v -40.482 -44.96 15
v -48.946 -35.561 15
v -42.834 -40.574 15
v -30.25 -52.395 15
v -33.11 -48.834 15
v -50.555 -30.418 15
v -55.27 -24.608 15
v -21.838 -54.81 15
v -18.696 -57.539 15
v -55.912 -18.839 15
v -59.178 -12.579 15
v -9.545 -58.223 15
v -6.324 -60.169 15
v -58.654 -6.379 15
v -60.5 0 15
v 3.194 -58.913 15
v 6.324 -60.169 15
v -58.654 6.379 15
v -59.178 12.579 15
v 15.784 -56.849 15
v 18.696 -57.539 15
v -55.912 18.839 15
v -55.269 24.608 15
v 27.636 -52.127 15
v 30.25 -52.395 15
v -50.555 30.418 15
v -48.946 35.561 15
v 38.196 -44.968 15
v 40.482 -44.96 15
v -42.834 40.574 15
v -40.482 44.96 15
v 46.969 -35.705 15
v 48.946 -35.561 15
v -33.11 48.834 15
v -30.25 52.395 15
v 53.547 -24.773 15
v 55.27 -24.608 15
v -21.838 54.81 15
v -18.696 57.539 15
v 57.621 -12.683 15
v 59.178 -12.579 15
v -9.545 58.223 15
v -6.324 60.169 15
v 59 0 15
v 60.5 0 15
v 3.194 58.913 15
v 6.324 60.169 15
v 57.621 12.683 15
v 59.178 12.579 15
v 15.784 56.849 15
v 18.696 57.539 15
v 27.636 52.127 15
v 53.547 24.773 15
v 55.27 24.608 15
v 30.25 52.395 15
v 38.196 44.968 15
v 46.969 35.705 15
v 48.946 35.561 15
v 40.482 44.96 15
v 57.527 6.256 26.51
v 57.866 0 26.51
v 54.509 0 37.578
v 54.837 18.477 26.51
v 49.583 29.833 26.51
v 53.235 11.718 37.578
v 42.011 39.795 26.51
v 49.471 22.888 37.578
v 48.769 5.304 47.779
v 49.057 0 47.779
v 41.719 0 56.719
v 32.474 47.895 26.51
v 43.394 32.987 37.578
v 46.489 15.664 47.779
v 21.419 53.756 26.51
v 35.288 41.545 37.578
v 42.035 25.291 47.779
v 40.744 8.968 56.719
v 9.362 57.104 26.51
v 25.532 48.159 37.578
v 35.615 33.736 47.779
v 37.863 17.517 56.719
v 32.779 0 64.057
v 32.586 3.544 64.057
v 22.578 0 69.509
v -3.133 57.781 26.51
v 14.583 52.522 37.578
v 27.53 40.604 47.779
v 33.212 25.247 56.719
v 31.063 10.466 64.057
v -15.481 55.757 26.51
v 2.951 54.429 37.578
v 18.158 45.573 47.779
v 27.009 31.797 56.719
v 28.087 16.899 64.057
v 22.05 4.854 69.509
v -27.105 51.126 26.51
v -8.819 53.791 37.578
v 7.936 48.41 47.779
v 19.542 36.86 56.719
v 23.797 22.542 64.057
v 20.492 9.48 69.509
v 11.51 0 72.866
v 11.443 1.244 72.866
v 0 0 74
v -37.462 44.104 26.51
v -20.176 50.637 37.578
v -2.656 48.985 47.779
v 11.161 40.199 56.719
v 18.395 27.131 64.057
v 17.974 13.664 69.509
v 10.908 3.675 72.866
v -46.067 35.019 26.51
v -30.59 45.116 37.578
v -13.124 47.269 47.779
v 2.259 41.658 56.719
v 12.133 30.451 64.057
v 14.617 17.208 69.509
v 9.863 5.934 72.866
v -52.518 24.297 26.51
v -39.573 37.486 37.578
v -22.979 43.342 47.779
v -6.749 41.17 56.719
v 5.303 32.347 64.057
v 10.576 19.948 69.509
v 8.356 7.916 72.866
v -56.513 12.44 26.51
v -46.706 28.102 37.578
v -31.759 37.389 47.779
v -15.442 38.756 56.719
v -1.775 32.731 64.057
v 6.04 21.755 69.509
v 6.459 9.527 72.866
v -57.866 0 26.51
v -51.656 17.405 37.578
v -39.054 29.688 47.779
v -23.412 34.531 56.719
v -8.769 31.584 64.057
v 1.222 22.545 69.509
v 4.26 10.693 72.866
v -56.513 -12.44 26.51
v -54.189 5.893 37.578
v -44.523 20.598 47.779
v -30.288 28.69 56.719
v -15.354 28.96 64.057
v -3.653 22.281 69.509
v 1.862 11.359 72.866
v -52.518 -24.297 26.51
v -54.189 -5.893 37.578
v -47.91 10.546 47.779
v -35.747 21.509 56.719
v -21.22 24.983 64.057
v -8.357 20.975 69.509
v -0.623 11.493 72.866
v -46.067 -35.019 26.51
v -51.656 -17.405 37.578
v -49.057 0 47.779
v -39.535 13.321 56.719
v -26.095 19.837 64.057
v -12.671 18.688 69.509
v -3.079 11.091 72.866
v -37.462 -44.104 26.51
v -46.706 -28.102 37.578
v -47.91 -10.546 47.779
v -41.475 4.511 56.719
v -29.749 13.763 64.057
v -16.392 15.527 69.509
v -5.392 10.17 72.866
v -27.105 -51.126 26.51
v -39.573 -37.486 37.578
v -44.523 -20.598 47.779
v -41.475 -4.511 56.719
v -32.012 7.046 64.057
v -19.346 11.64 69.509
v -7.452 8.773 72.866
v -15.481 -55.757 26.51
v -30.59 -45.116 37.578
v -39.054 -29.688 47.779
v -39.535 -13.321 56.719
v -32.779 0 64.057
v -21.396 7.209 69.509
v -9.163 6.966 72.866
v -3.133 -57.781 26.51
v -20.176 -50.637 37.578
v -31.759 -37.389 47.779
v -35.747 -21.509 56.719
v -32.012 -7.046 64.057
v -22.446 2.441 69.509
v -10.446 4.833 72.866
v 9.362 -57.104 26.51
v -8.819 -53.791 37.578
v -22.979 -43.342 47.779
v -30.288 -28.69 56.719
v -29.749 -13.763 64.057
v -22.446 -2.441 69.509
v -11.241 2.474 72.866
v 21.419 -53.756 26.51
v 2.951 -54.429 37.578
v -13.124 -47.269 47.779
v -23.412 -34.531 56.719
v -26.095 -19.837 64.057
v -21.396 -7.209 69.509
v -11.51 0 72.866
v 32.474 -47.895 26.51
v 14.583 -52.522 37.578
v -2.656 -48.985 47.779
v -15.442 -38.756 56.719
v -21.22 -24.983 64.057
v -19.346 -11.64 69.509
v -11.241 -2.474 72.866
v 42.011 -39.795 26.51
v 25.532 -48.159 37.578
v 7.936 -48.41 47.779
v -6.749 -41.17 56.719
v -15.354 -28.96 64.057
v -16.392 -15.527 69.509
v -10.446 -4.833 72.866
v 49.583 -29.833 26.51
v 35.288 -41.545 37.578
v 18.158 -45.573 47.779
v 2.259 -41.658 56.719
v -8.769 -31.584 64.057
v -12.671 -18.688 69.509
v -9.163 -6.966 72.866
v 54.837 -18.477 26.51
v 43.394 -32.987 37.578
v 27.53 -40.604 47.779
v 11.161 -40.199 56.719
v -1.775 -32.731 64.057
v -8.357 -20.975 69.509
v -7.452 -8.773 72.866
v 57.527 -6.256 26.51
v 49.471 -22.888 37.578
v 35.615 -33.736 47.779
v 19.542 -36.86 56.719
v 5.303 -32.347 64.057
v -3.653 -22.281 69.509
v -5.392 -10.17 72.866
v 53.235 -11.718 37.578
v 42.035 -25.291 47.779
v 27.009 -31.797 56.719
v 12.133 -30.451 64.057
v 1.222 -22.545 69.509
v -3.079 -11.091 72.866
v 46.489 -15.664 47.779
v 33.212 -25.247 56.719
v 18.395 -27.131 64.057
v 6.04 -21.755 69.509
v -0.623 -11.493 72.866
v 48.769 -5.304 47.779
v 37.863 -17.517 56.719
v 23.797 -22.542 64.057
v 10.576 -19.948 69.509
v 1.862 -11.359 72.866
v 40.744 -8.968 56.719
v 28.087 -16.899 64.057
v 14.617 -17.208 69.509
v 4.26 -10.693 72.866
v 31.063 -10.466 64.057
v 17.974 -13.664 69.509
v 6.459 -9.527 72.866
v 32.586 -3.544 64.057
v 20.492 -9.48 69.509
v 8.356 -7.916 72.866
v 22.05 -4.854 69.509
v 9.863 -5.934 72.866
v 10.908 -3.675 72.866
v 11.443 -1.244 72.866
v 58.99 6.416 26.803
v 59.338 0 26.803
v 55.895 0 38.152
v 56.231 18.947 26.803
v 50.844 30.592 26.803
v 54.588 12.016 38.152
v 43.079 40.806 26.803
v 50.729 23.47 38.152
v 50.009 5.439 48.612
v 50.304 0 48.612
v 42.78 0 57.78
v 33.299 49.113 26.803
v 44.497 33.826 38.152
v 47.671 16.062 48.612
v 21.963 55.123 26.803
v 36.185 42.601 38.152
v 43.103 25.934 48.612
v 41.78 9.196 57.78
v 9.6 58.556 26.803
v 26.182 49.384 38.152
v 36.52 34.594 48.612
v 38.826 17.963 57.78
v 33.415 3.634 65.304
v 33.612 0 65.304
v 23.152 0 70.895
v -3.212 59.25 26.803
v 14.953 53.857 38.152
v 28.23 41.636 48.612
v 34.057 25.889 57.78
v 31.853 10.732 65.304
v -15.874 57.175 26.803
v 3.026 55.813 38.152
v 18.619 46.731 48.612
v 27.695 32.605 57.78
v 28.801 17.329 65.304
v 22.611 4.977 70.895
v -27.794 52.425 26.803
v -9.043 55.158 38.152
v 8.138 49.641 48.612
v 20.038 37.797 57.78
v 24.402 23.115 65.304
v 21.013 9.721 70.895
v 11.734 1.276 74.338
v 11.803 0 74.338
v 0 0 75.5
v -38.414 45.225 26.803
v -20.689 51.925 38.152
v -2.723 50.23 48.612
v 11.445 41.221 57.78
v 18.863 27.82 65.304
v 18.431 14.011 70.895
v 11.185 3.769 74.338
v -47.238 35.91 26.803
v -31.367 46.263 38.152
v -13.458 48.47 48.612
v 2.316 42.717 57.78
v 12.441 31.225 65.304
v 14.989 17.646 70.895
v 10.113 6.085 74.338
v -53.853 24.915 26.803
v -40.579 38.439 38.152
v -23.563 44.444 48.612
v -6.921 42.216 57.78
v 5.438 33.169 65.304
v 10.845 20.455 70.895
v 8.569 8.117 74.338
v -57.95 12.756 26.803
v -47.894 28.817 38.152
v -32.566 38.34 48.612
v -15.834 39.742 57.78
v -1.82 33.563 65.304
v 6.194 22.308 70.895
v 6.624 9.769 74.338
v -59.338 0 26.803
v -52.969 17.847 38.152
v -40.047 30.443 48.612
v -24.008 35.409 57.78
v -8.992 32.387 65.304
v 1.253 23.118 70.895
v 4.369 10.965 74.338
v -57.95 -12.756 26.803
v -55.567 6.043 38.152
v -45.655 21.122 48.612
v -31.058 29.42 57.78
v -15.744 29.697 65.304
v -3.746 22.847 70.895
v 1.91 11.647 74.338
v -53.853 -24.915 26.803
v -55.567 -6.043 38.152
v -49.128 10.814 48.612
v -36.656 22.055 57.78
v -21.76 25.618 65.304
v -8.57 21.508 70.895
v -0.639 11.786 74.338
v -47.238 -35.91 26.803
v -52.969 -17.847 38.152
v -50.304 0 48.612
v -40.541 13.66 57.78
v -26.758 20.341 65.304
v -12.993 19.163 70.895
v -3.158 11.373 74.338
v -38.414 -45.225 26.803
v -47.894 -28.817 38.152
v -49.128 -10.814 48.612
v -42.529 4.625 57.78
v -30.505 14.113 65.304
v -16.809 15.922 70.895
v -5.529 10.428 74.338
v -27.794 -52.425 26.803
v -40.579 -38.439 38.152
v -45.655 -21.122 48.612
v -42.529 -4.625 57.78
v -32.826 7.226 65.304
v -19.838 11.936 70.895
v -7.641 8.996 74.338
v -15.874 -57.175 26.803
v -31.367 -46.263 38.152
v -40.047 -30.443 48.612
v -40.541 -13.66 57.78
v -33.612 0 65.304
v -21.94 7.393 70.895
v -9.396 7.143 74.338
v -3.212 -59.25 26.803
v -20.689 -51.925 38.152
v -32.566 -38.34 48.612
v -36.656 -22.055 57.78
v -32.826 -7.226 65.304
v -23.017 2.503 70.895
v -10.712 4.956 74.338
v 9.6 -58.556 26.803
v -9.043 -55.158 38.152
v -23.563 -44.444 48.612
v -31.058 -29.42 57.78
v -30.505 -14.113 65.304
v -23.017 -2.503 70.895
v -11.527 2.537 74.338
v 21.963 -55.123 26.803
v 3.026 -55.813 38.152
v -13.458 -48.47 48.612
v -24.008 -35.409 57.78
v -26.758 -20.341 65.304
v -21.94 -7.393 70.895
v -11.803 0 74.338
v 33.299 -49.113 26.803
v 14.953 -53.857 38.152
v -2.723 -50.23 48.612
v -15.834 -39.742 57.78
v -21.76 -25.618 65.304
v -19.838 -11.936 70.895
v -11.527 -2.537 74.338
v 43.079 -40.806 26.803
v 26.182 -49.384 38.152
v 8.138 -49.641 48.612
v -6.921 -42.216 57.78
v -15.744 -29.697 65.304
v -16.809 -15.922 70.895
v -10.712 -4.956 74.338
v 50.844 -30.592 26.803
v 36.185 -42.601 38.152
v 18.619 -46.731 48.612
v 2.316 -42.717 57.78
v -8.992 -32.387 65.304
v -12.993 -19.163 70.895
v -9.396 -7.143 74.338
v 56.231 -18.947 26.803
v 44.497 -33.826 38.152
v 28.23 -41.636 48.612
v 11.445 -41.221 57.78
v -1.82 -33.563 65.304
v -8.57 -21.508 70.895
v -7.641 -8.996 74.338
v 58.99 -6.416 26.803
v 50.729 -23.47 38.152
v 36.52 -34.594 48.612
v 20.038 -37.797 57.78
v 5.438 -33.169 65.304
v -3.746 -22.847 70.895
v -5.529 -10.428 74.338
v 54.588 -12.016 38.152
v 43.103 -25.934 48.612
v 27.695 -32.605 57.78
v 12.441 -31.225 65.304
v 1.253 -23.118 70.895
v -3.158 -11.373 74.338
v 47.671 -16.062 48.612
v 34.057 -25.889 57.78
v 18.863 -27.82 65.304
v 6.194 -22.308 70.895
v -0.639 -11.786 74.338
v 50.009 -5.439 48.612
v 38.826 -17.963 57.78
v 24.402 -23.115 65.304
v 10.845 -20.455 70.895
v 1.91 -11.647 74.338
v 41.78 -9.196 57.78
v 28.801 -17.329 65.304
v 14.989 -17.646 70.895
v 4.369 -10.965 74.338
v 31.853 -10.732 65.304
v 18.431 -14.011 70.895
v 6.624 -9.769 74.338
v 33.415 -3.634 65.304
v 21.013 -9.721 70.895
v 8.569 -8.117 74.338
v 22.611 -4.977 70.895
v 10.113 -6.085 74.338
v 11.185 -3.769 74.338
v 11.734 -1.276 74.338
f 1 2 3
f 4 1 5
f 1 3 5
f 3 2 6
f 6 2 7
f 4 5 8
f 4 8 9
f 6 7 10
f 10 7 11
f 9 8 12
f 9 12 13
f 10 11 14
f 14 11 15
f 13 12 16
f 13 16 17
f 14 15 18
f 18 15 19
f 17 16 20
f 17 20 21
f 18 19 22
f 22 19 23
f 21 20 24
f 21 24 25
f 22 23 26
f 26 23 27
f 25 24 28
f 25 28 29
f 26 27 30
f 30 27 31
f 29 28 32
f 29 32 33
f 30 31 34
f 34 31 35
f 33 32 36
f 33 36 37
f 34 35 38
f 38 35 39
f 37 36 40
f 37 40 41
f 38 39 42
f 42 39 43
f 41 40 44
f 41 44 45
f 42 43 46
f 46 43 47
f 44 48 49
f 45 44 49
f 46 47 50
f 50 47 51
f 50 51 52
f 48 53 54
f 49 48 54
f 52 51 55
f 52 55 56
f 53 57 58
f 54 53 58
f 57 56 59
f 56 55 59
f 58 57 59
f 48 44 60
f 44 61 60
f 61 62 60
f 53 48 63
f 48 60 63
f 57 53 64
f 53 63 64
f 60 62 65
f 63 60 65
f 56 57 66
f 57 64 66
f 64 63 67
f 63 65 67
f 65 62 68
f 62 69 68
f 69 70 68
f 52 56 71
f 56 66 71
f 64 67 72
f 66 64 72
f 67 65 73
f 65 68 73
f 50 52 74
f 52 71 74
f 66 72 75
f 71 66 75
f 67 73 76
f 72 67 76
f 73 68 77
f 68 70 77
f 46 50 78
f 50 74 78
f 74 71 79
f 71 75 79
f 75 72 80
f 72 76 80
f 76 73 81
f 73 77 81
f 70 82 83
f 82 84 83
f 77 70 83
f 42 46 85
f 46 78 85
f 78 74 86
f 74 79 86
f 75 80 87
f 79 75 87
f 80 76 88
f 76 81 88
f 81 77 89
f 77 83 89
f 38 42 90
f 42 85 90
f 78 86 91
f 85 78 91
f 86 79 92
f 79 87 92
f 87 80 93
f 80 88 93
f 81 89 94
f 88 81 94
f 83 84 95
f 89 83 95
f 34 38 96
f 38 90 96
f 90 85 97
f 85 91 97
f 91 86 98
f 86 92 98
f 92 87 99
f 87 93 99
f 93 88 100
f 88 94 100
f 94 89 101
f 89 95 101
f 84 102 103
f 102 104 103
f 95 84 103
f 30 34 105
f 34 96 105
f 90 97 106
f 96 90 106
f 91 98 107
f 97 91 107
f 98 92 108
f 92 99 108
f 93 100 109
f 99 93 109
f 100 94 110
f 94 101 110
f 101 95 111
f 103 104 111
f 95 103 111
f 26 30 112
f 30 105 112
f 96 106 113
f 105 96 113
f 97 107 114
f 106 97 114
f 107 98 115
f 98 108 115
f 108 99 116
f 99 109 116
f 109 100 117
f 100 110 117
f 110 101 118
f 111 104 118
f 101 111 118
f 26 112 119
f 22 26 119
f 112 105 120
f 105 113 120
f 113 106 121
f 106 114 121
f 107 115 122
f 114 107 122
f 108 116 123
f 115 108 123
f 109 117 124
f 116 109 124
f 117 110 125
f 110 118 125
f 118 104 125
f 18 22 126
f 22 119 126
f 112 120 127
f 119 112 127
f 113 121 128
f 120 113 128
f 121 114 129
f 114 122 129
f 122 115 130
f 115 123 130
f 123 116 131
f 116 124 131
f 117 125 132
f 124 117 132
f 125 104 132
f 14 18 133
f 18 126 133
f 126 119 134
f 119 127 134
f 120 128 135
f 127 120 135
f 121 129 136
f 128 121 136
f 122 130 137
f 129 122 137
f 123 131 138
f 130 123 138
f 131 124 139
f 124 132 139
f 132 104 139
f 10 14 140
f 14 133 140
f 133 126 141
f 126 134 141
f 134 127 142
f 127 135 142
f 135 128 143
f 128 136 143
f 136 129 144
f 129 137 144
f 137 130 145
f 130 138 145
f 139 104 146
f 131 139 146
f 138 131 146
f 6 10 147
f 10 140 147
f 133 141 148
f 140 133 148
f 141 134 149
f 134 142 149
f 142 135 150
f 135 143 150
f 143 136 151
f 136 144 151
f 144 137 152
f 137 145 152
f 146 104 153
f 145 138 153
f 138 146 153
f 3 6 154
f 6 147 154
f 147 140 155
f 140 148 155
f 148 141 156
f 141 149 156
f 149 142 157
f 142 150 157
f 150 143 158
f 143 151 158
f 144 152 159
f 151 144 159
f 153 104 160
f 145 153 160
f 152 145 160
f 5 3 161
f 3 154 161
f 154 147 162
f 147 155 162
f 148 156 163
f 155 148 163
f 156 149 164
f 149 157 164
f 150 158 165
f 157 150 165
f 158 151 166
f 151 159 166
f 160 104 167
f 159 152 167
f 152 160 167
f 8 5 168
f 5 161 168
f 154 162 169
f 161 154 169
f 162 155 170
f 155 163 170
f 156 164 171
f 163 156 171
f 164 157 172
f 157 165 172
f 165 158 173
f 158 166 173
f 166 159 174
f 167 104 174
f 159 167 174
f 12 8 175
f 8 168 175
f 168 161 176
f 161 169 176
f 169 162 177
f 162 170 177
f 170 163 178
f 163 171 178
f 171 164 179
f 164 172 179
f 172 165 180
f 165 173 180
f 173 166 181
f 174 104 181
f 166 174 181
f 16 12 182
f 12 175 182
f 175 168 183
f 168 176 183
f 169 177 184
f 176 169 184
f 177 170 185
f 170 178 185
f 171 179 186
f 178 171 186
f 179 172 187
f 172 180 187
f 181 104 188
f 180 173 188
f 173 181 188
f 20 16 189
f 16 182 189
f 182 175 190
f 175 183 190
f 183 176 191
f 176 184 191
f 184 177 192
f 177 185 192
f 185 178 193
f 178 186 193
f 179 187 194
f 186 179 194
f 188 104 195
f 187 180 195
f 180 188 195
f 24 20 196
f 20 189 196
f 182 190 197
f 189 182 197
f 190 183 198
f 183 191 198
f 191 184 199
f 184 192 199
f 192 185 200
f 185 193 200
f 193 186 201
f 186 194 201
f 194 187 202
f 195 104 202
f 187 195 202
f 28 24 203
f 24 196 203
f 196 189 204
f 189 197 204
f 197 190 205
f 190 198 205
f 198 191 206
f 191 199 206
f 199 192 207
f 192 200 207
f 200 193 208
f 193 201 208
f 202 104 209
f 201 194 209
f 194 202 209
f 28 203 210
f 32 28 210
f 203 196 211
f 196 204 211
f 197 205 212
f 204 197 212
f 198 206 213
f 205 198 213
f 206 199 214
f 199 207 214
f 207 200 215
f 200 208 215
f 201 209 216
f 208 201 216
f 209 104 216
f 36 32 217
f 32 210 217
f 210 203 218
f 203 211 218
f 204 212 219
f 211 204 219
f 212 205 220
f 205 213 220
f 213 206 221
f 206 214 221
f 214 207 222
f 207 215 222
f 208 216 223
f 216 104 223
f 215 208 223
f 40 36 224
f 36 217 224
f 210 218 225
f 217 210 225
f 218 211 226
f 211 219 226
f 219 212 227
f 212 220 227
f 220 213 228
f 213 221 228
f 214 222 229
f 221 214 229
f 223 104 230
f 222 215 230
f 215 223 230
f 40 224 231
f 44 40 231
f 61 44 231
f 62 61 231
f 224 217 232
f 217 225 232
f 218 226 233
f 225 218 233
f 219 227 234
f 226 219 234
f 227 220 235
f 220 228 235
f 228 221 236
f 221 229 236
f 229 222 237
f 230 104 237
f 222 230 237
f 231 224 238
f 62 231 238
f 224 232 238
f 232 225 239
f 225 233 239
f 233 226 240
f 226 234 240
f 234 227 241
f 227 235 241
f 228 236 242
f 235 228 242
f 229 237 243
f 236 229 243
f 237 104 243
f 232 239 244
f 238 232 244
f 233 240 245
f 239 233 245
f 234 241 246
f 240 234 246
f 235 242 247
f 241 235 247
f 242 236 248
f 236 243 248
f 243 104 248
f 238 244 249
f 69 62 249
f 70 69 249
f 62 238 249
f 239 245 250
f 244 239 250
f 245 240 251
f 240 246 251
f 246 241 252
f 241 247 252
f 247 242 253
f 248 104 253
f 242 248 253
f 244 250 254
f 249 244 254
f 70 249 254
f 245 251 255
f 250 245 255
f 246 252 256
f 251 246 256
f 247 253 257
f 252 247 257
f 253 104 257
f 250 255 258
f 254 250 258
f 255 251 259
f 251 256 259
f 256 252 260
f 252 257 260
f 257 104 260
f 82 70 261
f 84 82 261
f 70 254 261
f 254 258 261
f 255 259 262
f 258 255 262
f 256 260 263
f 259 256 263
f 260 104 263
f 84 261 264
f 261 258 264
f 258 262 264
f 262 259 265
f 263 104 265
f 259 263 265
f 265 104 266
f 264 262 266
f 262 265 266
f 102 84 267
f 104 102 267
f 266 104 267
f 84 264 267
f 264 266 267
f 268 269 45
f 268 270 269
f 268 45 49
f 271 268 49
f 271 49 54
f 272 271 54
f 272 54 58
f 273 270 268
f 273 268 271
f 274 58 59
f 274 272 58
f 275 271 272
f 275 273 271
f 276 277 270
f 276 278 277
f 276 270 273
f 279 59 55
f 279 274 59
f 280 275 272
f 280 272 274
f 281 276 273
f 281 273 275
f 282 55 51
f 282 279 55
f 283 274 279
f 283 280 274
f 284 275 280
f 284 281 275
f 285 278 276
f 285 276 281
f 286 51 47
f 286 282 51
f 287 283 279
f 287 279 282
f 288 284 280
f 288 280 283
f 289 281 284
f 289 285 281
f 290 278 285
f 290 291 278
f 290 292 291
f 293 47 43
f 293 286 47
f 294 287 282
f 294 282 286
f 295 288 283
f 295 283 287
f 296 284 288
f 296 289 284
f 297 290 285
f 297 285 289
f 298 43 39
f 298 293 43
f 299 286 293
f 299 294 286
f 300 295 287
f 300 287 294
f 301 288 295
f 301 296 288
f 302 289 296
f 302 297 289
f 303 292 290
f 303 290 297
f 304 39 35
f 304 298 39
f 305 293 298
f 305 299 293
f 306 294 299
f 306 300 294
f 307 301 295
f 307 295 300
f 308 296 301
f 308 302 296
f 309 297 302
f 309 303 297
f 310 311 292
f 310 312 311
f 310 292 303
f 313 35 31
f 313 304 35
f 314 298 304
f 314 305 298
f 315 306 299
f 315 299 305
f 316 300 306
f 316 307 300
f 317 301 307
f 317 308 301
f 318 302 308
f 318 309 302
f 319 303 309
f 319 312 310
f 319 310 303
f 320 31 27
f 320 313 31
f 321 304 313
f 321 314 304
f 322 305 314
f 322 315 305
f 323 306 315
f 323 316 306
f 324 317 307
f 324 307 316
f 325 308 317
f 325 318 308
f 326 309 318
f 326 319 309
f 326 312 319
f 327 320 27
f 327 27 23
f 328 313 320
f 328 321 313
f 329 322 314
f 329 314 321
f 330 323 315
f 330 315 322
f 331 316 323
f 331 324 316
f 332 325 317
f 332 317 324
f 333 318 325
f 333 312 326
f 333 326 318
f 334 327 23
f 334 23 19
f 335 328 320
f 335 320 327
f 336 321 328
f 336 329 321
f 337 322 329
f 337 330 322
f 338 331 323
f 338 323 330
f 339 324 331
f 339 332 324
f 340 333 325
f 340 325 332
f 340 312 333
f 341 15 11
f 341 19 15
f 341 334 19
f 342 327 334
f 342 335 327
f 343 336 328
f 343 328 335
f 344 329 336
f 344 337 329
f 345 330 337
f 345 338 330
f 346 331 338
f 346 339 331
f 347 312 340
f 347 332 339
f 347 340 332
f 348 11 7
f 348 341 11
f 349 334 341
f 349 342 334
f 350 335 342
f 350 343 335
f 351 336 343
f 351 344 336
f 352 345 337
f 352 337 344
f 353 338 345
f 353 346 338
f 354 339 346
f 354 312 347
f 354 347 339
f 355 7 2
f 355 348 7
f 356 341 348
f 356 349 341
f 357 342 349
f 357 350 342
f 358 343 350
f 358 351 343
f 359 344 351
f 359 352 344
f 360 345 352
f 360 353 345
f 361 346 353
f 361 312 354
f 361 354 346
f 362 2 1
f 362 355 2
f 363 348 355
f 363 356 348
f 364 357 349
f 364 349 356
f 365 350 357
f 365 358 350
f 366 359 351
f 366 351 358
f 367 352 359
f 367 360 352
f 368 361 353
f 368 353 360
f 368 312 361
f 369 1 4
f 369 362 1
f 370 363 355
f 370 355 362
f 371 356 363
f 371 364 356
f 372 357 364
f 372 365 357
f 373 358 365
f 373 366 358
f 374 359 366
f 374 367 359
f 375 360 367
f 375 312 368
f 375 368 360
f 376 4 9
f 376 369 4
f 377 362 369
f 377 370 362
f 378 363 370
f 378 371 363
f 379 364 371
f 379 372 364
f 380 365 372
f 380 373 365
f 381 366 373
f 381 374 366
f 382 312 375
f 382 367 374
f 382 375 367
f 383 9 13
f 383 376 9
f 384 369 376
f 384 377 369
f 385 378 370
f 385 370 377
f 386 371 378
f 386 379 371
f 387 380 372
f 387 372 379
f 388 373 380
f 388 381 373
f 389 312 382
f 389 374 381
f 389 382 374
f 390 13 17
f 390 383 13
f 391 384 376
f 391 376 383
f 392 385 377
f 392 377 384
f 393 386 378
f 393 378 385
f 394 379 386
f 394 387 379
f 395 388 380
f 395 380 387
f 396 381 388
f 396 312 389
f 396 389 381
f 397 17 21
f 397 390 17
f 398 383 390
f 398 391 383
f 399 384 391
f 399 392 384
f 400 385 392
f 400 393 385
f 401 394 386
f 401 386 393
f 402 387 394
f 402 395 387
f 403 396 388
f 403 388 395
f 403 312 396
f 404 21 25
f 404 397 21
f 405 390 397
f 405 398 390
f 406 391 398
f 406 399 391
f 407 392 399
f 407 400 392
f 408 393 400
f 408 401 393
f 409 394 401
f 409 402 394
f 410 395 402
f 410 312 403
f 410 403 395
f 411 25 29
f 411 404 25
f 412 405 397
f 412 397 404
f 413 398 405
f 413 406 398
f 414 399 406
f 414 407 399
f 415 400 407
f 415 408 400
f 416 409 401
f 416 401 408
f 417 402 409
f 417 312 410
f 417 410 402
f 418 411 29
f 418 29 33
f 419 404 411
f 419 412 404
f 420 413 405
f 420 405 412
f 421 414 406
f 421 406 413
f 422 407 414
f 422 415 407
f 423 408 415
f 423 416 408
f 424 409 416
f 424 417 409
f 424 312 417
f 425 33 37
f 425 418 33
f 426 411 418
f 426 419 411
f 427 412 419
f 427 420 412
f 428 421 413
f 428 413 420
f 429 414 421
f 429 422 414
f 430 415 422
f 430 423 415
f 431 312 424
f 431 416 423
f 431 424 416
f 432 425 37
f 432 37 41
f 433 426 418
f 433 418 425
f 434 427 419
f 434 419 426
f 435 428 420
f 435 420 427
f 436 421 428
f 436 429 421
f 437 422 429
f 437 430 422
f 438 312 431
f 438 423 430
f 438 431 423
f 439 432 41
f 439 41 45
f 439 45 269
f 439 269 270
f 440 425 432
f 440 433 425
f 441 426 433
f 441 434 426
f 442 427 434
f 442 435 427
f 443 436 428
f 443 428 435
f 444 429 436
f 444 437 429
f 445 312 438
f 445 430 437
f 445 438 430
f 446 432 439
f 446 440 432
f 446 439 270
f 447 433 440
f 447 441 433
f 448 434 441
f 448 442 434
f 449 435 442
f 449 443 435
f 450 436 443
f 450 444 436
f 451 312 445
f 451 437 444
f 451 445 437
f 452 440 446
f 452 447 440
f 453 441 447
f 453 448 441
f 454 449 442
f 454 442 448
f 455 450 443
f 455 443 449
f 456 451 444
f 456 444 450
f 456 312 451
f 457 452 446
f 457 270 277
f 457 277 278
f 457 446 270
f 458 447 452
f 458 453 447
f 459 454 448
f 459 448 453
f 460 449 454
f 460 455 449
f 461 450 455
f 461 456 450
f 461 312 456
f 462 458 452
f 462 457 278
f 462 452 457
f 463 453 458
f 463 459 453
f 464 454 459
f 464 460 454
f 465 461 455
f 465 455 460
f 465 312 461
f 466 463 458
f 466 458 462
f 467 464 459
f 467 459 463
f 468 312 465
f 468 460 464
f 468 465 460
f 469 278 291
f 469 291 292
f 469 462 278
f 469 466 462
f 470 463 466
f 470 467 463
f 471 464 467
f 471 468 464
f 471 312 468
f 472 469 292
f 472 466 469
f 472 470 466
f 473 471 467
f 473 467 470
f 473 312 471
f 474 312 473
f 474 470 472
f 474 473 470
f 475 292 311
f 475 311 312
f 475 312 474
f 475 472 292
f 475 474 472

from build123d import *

# Parameters (mm, degrees)
BOX013_W     = 121
BOX013_H     = 121
BOX013_DEPTH = 60.5


with BuildPart() as cockpitglasshalfcutter:
    # Box013 → Box013 (new body)
    with BuildSketch(Plane(origin=(-60.5, -60.5, -45.5), x_dir=(1, 0, 0), z_dir=(0, 0, 1))):
        with Locations((60.5, 60.5)):
            Rectangle(BOX013_W, BOX013_H)
    extrude(amount=BOX013_DEPTH)


with BuildPart() as cockpitglassinnercutter:
    # Sphere001 → Sphere001 (revolve)
    with BuildSketch(Plane(origin=(0, 0, 15), x_dir=(1, 0, 0), z_dir=(0, -1, 0))):
        with BuildLine():
            ThreePointArc((0, -59), (59, 0), (0, 59))
            Line((0, 59), (0, -59))
        make_face()
    revolve(axis=Axis((0, 0, 15), (0, 0, 1)))


with BuildPart() as cockpitglass1:
    # Sphere → Sphere (revolve)
    with BuildSketch(Plane(origin=(0, 0, 15), x_dir=(1, 0, 0), z_dir=(0, -1, 0))):
        with BuildLine():
            ThreePointArc((0, -60.5), (60.5, 0), (0, 60.5))
            Line((0, 60.5), (0, -60.5))
        make_face()
    revolve(axis=Axis((0, 0, 15), (0, 0, 1)))

    # Cut038: cut CockpitGlassInnerCutter
    add(cockpitglassinnercutter.part, mode=Mode.SUBTRACT)

    # Cut039: cut CockpitGlassHalfCutter
    add(cockpitglasshalfcutter.part, mode=Mode.SUBTRACT)


solid = cockpitglass1.part
